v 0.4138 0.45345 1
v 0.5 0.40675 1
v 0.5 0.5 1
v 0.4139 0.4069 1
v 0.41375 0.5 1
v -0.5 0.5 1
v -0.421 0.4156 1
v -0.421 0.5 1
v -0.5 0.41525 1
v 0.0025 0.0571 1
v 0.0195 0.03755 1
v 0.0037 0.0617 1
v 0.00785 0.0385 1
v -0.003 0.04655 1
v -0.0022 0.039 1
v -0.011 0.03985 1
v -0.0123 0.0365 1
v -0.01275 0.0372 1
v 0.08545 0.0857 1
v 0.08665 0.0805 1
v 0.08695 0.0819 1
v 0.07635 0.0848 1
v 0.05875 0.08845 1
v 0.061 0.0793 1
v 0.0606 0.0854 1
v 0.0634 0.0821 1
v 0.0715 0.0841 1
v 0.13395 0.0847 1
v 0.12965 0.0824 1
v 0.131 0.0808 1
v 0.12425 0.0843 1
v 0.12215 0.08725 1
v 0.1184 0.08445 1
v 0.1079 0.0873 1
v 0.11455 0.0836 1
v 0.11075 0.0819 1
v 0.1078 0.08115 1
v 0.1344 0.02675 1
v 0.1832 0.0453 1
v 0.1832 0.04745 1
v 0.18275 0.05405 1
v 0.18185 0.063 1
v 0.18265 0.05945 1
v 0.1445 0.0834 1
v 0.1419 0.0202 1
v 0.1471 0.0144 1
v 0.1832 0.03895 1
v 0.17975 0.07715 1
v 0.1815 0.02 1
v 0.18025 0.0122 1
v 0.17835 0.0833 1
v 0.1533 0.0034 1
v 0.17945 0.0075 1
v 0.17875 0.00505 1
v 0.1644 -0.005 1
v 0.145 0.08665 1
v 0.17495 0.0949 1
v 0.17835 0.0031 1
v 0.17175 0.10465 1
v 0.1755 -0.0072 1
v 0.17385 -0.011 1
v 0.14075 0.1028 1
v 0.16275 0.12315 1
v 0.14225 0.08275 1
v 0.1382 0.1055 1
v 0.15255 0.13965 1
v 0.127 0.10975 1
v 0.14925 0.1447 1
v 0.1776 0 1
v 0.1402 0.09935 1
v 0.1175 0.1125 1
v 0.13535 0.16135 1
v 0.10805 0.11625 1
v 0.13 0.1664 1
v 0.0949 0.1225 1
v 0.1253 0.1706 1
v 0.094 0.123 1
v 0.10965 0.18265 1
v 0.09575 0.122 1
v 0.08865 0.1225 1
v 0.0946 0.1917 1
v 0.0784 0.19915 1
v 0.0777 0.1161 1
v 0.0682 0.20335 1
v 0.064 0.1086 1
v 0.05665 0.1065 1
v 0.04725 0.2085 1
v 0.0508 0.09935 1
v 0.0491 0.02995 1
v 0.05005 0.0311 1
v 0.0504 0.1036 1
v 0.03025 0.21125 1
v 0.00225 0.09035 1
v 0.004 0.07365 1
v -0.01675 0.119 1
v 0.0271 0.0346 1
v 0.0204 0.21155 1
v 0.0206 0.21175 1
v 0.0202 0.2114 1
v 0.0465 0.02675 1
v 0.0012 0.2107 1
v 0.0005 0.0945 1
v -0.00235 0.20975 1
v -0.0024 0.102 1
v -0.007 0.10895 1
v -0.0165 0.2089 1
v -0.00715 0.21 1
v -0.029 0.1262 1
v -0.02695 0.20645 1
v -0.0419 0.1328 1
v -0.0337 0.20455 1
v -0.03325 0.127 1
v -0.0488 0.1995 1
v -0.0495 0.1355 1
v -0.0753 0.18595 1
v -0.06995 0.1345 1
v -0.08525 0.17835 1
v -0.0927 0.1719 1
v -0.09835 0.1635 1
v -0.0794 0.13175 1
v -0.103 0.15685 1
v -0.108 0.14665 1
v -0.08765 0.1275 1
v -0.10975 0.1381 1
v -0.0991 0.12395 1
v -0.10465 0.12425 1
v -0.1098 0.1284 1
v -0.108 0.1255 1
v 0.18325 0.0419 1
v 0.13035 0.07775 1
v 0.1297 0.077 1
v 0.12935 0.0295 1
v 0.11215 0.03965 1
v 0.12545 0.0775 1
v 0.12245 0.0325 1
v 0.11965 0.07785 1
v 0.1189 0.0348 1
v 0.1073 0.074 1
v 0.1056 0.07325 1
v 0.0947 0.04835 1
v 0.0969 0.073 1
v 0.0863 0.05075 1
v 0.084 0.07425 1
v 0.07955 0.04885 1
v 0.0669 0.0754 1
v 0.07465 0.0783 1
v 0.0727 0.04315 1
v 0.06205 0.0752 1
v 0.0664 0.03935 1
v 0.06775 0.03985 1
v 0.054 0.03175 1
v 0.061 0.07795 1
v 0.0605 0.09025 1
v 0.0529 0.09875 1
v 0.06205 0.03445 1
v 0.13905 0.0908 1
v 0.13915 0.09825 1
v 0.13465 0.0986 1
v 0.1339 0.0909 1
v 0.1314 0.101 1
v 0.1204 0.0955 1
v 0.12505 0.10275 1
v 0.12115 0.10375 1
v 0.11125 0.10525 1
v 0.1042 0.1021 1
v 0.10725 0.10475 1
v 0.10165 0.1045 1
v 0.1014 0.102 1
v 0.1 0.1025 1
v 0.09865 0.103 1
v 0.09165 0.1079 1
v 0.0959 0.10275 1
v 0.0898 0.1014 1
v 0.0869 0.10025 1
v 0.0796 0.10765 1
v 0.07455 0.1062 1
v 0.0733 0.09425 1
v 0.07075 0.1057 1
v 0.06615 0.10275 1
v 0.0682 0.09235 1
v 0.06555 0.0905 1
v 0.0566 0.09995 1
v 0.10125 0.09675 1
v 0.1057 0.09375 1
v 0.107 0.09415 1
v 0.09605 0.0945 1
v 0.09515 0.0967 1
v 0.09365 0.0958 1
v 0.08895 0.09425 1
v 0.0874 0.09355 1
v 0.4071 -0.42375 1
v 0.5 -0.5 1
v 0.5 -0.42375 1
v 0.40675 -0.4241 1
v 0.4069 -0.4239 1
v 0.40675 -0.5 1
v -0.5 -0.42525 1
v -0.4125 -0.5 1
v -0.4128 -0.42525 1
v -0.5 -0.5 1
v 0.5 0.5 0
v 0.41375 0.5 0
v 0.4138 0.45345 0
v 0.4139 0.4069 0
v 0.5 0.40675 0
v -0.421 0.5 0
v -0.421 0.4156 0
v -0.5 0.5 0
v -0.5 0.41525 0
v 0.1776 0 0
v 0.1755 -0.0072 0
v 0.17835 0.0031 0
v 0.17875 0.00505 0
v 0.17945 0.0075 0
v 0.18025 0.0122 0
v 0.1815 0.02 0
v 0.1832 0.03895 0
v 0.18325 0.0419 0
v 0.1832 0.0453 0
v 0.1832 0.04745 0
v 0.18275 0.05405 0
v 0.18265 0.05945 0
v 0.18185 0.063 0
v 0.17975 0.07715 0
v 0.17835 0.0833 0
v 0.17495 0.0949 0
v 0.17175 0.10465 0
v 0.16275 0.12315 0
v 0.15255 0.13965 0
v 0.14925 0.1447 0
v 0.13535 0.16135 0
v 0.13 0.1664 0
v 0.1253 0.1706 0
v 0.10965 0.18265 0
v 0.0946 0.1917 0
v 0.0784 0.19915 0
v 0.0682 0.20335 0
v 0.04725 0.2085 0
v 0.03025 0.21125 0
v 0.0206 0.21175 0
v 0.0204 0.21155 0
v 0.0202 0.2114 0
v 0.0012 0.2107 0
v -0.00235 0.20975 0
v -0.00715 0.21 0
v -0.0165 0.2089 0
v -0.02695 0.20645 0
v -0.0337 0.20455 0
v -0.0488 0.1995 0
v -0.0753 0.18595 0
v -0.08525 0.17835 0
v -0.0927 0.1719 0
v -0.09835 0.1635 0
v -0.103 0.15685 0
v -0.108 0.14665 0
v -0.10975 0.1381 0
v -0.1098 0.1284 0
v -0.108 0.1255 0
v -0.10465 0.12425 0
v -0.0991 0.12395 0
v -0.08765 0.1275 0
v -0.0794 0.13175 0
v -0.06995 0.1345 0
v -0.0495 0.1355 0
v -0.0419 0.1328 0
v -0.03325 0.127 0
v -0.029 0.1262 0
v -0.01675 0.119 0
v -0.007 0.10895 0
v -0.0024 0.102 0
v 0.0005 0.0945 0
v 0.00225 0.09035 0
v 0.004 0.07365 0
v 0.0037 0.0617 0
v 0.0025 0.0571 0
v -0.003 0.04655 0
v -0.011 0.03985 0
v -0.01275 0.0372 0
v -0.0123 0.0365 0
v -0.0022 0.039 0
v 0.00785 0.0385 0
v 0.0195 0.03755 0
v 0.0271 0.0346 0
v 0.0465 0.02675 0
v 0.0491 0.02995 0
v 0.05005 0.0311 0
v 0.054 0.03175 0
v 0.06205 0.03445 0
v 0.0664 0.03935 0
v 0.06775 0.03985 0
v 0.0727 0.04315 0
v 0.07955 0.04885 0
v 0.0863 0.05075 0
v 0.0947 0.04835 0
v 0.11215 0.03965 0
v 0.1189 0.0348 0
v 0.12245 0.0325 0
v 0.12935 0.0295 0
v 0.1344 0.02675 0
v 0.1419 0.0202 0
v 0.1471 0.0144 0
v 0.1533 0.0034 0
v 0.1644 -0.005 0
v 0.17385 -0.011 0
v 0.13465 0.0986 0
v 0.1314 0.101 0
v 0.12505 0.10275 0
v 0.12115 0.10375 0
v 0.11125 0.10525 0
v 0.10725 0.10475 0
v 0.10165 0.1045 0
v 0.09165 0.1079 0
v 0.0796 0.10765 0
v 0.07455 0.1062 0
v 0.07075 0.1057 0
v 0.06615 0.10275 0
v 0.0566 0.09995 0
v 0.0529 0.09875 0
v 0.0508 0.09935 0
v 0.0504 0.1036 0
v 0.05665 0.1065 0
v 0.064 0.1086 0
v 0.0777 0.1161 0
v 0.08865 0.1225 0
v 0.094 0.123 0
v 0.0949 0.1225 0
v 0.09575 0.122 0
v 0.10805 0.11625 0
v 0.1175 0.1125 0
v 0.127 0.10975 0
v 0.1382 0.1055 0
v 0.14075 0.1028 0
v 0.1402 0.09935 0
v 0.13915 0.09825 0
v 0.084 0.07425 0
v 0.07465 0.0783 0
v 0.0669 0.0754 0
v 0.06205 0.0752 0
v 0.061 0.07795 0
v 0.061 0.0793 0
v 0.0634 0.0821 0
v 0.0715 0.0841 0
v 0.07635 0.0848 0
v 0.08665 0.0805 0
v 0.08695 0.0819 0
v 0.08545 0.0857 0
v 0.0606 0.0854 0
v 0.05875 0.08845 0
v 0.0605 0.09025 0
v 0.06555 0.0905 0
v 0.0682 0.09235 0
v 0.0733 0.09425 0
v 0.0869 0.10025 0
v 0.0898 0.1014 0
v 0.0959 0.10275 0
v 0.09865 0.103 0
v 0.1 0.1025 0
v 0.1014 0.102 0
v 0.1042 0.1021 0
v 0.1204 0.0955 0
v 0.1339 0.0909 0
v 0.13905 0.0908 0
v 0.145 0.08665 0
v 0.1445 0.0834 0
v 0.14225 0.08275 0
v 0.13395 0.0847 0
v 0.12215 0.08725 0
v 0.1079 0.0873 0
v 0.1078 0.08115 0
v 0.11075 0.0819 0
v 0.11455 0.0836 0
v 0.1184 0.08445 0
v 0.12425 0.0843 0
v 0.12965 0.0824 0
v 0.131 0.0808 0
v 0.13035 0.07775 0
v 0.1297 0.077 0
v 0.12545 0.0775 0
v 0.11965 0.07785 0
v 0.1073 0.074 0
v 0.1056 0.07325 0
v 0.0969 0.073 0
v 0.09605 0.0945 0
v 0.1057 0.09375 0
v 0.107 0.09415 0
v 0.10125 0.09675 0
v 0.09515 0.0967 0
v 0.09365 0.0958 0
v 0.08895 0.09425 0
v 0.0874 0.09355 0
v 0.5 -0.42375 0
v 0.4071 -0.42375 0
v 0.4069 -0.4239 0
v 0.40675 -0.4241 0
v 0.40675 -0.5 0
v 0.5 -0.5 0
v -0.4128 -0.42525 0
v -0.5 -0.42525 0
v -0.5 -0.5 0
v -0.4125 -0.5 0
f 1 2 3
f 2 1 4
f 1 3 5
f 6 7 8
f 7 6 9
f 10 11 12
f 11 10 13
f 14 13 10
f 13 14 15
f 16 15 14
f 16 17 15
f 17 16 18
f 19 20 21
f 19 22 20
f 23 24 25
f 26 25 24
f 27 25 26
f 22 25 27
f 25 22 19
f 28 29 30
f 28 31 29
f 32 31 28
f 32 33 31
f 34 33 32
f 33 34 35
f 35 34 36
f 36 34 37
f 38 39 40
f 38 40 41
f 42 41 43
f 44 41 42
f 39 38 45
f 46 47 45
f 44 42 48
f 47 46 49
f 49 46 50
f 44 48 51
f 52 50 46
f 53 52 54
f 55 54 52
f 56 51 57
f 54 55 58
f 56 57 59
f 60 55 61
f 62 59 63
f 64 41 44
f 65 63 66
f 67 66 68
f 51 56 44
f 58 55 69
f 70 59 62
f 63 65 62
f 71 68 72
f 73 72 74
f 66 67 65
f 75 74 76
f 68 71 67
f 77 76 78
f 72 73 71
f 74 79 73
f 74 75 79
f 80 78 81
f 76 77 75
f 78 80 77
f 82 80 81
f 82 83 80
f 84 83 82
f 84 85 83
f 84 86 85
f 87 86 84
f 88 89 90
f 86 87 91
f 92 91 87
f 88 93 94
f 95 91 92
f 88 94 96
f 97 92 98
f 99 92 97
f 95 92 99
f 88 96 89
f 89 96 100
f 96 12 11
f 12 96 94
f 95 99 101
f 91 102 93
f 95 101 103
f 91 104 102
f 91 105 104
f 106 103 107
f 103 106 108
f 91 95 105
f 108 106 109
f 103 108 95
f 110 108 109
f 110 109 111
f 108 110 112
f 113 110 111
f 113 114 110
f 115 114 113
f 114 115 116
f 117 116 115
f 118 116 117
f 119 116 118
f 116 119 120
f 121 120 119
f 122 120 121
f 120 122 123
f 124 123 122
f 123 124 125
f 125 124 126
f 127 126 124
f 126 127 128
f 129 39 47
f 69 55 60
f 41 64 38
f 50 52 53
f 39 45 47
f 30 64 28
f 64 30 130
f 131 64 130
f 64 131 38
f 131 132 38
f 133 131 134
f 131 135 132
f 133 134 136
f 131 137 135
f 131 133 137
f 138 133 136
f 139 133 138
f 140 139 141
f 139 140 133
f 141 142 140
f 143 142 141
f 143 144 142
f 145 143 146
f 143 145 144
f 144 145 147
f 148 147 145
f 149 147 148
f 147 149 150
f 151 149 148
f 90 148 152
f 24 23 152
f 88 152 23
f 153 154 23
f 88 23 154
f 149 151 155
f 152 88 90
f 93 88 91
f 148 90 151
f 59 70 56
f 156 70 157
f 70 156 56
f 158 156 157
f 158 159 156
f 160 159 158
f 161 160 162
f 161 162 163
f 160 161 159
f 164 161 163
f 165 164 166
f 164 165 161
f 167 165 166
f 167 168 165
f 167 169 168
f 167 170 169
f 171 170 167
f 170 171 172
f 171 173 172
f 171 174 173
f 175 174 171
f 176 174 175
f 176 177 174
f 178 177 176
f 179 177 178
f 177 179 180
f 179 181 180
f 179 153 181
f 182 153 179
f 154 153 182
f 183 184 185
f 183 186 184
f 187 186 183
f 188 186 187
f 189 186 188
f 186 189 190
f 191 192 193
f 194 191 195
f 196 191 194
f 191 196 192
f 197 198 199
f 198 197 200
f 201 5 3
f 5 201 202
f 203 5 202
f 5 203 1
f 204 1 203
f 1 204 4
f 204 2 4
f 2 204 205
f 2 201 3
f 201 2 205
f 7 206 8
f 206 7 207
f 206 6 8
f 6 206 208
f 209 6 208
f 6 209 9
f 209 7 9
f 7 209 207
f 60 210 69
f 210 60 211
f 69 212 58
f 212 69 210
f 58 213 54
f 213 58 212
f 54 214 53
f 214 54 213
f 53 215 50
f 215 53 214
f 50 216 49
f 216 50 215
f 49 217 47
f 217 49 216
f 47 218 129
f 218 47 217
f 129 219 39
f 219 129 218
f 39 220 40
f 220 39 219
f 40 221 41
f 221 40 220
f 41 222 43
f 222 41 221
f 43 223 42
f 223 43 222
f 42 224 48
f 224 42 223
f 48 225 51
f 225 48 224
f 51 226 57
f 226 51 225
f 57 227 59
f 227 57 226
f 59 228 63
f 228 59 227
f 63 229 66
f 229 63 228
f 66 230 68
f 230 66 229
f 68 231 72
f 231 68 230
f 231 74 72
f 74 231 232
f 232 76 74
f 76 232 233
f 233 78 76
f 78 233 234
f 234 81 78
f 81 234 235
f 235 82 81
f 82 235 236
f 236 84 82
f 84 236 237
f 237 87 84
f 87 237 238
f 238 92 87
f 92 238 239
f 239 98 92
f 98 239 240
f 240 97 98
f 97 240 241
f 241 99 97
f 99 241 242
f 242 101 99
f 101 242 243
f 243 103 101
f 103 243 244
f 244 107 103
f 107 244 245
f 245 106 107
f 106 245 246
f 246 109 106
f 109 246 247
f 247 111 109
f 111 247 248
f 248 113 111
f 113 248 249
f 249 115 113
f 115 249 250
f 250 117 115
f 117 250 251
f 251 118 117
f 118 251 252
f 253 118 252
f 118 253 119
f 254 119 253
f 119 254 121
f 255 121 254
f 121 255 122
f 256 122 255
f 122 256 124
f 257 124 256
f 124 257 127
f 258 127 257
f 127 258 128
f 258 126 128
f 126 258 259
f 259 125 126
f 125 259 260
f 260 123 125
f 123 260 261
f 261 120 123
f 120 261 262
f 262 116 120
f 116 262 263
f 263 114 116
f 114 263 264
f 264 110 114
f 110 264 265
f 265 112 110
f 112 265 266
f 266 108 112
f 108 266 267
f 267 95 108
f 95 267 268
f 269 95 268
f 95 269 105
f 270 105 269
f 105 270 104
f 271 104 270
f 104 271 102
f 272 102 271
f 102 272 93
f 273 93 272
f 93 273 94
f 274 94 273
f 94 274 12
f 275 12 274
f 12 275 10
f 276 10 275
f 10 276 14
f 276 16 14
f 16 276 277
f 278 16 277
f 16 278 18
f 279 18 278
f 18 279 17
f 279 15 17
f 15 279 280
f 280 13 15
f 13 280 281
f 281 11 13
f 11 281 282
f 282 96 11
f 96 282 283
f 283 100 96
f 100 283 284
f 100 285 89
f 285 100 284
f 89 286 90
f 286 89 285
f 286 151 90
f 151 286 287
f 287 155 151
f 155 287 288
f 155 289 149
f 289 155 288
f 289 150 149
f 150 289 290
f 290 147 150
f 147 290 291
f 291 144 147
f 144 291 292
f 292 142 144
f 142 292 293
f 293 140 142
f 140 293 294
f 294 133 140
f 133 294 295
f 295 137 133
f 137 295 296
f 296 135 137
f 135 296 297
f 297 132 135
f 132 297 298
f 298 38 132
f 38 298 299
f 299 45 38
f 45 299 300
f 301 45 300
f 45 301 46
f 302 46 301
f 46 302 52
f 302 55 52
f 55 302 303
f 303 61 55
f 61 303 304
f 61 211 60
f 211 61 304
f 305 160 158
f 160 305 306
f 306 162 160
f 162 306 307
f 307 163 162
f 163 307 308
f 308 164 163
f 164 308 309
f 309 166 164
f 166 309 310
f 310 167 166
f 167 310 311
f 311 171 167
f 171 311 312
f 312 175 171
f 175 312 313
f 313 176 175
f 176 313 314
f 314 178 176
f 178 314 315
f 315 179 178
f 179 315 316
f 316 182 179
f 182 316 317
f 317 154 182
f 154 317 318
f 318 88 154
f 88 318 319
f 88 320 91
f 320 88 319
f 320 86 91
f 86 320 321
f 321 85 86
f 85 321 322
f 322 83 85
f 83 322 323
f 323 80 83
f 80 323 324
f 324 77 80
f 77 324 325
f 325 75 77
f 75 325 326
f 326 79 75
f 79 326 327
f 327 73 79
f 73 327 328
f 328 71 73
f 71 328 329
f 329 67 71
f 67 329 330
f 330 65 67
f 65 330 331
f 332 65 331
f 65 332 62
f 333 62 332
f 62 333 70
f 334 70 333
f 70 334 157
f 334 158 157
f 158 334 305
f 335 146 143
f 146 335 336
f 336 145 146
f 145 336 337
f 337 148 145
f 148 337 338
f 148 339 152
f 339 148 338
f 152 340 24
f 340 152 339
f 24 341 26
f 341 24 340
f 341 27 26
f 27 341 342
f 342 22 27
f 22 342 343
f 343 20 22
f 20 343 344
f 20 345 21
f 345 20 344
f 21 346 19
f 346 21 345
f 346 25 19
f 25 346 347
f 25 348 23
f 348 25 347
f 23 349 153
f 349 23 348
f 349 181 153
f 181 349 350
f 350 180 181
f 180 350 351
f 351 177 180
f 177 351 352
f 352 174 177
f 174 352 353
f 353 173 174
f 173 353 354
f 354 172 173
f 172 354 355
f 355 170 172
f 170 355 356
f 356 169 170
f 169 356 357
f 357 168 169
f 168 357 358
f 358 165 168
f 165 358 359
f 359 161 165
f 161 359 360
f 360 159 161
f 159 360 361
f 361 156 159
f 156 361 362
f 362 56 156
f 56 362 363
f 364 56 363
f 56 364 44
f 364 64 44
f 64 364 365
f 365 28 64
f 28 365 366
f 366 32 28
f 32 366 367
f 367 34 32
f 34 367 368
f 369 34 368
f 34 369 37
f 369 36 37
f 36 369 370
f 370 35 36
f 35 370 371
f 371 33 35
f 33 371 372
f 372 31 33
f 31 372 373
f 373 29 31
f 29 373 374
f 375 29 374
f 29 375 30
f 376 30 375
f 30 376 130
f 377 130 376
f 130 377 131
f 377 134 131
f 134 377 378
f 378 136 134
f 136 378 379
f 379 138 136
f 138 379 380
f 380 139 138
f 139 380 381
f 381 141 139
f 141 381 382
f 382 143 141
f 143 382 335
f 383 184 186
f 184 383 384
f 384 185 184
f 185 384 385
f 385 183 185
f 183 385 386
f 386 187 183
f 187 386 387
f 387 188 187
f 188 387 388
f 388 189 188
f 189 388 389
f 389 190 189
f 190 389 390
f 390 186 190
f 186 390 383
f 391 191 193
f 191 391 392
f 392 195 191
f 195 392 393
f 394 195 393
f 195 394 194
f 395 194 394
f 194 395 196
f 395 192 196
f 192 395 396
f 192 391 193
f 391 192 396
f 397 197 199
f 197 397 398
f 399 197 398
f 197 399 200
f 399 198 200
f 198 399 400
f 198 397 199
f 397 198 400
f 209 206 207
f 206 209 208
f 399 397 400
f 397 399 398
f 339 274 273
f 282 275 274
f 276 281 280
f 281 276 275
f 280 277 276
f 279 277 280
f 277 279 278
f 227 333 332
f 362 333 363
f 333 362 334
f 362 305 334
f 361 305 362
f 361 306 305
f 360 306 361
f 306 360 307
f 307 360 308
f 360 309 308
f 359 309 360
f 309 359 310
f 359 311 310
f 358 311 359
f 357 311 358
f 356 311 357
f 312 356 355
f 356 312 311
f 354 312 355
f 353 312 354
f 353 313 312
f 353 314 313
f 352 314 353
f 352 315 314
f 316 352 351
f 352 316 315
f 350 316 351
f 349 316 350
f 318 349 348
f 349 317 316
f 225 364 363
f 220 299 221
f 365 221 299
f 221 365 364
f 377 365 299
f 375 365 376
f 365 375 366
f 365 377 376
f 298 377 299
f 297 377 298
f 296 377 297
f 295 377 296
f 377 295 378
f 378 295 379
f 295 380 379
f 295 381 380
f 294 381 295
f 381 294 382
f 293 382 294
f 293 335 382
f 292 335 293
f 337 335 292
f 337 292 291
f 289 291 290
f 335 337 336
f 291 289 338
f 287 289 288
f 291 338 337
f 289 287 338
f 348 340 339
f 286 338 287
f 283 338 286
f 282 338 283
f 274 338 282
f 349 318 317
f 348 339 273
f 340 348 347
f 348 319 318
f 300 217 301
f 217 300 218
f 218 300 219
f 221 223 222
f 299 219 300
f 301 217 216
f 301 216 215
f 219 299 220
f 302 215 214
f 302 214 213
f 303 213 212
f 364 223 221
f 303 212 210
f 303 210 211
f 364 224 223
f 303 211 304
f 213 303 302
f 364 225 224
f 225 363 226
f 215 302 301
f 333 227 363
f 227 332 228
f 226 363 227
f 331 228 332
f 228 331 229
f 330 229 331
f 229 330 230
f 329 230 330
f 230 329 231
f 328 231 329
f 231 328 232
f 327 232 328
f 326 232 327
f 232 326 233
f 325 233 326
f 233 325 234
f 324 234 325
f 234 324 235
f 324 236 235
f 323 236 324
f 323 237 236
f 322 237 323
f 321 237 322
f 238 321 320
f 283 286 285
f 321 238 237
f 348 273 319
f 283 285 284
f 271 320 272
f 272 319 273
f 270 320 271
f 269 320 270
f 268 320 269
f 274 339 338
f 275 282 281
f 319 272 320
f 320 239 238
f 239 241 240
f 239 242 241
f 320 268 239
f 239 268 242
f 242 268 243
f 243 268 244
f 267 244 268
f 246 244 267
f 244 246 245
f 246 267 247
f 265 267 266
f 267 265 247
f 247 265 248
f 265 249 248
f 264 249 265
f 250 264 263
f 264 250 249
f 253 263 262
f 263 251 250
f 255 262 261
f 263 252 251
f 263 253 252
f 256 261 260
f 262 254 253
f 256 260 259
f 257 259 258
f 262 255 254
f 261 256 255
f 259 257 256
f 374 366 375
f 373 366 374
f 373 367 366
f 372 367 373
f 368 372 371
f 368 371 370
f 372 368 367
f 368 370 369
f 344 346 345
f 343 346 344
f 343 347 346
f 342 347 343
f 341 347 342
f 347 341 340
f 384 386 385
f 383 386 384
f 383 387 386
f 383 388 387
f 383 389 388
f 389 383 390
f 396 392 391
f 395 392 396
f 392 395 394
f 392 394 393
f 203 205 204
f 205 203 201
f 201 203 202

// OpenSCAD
module ms1yellow_1()
{
 /* Generated by trace2scad version 20150415
    http://aggregate.org/MAKE/TRACE2SCAD/
    Optimized model has 203/1500 original points
 */
 color([0.5, 0.5, 0.5])
 assign(minx=0) /* polygon minx=0 */
 assign(miny=0) /* polygon miny=0 */
 assign(maxx=20000) /* polygon maxx=20000 */
 assign(maxy=20000) /* polygon maxy=20000 */
 assign(dx=maxx-minx)
 assign(dy=maxy-miny)
 assign(maxd=((dx>dy)?dx:dy))
 scale([1/maxd, 1/maxd, 1])
 translate([-minx-dx/2, -miny-dy/2, 0])
 linear_extrude(height=1, convexity=203)
 union() {
  union() {
   polygon([[0,19153],[0,18305],[1580,18312],[1580,20000],[0,20000]], convexity=5);
   polygon([[18276,19069],[18278,18138],[20000,18135],[20000,20000],[18275,20000]], convexity=5);
   union() {
    difference() {
     polygon([[10408,14231],[10404,14228],[10024,14214],[9953,14195],[9857,14200],[9670,14178],[9461,14129],[9326,14091],[9024,13990],[8494,13719],[8295,13567],[8146,13438],[8033,13270],[7940,13137],[7840,12933],[7805,12762],[7804,12568],[7840,12510],[7907,12485],[8018,12479],[8247,12550],[8412,12635],[8601,12690],[9010,12710],[9162,12656],[9335,12540],[9420,12524],[9665,12380],[9860,12179],[9952,12040],[10010,11890],[10045,11807],[10080,11473],[10074,11234],[10050,11142],[9940,10931],[9780,10797],[9745,10744],[9754,10730],[9956,10780],[10157,10770],[10390,10751],[10542,10692],[10930,10535],[10982,10599],[11001,10622],[11080,10635],[11241,10689],[11328,10787],[11355,10797],[11454,10863],[11591,10977],[11726,11015],[11894,10967],[12243,10793],[12378,10696],[12449,10650],[12587,10590],[12688,10535],[12838,10404],[12942,10288],[13066,10068],[13288,9900],[13477,9780],[13510,9856],[13552,10000],[13567,10062],[13575,10101],[13589,10150],[13605,10244],[13630,10400],[13664,10779],[13665,10838],[13664,10906],[13664,10949],[13655,11081],[13653,11189],[13637,11260],[13595,11543],[13567,11666],[13499,11898],[13435,12093],[13255,12463],[13051,12793],[12985,12894],[12707,13227],[12600,13328],[12506,13412],[12193,13653],[11892,13834],[11568,13983],[11364,14067],[10945,14170],[10605,14225],[10412,14235]], convexity=18);
     polygon([[11898,12450],[11915,12440],[12161,12325],[12350,12250],[12540,12195],[12764,12110],[12815,12056],[12804,11987],[12783,11965],[12693,11972],[12628,12020],[12501,12055],[12423,12075],[12225,12105],[12145,12095],[12033,12090],[11833,12158],[11592,12153],[11491,12124],[11415,12114],[11323,12055],[11132,11999],[11058,11975],[11016,11987],[11008,12072],[11133,12130],[11280,12172],[11554,12322],[11773,12450],[11880,12460]], convexity=10);
     polygon([[12000,12050],[12028,12040],[12084,12042],[12408,11910],[12678,11818],[12781,11816],[12900,11733],[12890,11668],[12845,11655],[12679,11694],[12443,11745],[12158,11746],[12156,11623],[12215,11638],[12291,11672],[12368,11689],[12485,11686],[12593,11648],[12620,11616],[12607,11555],[12594,11540],[12509,11550],[12393,11557],[12146,11480],[12112,11465],[11938,11460],[11680,11485],[11493,11566],[11338,11508],[11241,11504],[11220,11559],[11220,11586],[11268,11642],[11430,11682],[11527,11696],[11733,11610],[11739,11638],[11709,11714],[11212,11708],[11175,11769],[11210,11805],[11311,11810],[11364,11847],[11466,11885],[11738,12005],[11796,12028],[11918,12055],[11973,12060]], convexity=23);
    }
    polygon([[11888,11925],[11873,11916],[11779,11885],[11748,11871],[11921,11890],[12114,11875],[12140,11883],[12025,11935],[11903,11934]], convexity=8);
   }
   polygon([[18138,1522],[18135,1518],[18135,0],[20000,0],[20000,1525],[18142,1525]], convexity=6);
   polygon([[0,748],[0,0],[1750,0],[1744,1495],[0,1495]], convexity=5);
  }
 }
}

module ms1yellow()
{
 /* all layers combined, scaled to within a 1mm cube */
 scale([1, 1, 1/1])
 difference() {
  union() {
   scale([1,1,2]) translate([0,0,-0.5]) ms1yellow_1();
  }
  translate([0,0,-2]) cube([2,2,4],center=true);
 }
}
ms1yellow();
